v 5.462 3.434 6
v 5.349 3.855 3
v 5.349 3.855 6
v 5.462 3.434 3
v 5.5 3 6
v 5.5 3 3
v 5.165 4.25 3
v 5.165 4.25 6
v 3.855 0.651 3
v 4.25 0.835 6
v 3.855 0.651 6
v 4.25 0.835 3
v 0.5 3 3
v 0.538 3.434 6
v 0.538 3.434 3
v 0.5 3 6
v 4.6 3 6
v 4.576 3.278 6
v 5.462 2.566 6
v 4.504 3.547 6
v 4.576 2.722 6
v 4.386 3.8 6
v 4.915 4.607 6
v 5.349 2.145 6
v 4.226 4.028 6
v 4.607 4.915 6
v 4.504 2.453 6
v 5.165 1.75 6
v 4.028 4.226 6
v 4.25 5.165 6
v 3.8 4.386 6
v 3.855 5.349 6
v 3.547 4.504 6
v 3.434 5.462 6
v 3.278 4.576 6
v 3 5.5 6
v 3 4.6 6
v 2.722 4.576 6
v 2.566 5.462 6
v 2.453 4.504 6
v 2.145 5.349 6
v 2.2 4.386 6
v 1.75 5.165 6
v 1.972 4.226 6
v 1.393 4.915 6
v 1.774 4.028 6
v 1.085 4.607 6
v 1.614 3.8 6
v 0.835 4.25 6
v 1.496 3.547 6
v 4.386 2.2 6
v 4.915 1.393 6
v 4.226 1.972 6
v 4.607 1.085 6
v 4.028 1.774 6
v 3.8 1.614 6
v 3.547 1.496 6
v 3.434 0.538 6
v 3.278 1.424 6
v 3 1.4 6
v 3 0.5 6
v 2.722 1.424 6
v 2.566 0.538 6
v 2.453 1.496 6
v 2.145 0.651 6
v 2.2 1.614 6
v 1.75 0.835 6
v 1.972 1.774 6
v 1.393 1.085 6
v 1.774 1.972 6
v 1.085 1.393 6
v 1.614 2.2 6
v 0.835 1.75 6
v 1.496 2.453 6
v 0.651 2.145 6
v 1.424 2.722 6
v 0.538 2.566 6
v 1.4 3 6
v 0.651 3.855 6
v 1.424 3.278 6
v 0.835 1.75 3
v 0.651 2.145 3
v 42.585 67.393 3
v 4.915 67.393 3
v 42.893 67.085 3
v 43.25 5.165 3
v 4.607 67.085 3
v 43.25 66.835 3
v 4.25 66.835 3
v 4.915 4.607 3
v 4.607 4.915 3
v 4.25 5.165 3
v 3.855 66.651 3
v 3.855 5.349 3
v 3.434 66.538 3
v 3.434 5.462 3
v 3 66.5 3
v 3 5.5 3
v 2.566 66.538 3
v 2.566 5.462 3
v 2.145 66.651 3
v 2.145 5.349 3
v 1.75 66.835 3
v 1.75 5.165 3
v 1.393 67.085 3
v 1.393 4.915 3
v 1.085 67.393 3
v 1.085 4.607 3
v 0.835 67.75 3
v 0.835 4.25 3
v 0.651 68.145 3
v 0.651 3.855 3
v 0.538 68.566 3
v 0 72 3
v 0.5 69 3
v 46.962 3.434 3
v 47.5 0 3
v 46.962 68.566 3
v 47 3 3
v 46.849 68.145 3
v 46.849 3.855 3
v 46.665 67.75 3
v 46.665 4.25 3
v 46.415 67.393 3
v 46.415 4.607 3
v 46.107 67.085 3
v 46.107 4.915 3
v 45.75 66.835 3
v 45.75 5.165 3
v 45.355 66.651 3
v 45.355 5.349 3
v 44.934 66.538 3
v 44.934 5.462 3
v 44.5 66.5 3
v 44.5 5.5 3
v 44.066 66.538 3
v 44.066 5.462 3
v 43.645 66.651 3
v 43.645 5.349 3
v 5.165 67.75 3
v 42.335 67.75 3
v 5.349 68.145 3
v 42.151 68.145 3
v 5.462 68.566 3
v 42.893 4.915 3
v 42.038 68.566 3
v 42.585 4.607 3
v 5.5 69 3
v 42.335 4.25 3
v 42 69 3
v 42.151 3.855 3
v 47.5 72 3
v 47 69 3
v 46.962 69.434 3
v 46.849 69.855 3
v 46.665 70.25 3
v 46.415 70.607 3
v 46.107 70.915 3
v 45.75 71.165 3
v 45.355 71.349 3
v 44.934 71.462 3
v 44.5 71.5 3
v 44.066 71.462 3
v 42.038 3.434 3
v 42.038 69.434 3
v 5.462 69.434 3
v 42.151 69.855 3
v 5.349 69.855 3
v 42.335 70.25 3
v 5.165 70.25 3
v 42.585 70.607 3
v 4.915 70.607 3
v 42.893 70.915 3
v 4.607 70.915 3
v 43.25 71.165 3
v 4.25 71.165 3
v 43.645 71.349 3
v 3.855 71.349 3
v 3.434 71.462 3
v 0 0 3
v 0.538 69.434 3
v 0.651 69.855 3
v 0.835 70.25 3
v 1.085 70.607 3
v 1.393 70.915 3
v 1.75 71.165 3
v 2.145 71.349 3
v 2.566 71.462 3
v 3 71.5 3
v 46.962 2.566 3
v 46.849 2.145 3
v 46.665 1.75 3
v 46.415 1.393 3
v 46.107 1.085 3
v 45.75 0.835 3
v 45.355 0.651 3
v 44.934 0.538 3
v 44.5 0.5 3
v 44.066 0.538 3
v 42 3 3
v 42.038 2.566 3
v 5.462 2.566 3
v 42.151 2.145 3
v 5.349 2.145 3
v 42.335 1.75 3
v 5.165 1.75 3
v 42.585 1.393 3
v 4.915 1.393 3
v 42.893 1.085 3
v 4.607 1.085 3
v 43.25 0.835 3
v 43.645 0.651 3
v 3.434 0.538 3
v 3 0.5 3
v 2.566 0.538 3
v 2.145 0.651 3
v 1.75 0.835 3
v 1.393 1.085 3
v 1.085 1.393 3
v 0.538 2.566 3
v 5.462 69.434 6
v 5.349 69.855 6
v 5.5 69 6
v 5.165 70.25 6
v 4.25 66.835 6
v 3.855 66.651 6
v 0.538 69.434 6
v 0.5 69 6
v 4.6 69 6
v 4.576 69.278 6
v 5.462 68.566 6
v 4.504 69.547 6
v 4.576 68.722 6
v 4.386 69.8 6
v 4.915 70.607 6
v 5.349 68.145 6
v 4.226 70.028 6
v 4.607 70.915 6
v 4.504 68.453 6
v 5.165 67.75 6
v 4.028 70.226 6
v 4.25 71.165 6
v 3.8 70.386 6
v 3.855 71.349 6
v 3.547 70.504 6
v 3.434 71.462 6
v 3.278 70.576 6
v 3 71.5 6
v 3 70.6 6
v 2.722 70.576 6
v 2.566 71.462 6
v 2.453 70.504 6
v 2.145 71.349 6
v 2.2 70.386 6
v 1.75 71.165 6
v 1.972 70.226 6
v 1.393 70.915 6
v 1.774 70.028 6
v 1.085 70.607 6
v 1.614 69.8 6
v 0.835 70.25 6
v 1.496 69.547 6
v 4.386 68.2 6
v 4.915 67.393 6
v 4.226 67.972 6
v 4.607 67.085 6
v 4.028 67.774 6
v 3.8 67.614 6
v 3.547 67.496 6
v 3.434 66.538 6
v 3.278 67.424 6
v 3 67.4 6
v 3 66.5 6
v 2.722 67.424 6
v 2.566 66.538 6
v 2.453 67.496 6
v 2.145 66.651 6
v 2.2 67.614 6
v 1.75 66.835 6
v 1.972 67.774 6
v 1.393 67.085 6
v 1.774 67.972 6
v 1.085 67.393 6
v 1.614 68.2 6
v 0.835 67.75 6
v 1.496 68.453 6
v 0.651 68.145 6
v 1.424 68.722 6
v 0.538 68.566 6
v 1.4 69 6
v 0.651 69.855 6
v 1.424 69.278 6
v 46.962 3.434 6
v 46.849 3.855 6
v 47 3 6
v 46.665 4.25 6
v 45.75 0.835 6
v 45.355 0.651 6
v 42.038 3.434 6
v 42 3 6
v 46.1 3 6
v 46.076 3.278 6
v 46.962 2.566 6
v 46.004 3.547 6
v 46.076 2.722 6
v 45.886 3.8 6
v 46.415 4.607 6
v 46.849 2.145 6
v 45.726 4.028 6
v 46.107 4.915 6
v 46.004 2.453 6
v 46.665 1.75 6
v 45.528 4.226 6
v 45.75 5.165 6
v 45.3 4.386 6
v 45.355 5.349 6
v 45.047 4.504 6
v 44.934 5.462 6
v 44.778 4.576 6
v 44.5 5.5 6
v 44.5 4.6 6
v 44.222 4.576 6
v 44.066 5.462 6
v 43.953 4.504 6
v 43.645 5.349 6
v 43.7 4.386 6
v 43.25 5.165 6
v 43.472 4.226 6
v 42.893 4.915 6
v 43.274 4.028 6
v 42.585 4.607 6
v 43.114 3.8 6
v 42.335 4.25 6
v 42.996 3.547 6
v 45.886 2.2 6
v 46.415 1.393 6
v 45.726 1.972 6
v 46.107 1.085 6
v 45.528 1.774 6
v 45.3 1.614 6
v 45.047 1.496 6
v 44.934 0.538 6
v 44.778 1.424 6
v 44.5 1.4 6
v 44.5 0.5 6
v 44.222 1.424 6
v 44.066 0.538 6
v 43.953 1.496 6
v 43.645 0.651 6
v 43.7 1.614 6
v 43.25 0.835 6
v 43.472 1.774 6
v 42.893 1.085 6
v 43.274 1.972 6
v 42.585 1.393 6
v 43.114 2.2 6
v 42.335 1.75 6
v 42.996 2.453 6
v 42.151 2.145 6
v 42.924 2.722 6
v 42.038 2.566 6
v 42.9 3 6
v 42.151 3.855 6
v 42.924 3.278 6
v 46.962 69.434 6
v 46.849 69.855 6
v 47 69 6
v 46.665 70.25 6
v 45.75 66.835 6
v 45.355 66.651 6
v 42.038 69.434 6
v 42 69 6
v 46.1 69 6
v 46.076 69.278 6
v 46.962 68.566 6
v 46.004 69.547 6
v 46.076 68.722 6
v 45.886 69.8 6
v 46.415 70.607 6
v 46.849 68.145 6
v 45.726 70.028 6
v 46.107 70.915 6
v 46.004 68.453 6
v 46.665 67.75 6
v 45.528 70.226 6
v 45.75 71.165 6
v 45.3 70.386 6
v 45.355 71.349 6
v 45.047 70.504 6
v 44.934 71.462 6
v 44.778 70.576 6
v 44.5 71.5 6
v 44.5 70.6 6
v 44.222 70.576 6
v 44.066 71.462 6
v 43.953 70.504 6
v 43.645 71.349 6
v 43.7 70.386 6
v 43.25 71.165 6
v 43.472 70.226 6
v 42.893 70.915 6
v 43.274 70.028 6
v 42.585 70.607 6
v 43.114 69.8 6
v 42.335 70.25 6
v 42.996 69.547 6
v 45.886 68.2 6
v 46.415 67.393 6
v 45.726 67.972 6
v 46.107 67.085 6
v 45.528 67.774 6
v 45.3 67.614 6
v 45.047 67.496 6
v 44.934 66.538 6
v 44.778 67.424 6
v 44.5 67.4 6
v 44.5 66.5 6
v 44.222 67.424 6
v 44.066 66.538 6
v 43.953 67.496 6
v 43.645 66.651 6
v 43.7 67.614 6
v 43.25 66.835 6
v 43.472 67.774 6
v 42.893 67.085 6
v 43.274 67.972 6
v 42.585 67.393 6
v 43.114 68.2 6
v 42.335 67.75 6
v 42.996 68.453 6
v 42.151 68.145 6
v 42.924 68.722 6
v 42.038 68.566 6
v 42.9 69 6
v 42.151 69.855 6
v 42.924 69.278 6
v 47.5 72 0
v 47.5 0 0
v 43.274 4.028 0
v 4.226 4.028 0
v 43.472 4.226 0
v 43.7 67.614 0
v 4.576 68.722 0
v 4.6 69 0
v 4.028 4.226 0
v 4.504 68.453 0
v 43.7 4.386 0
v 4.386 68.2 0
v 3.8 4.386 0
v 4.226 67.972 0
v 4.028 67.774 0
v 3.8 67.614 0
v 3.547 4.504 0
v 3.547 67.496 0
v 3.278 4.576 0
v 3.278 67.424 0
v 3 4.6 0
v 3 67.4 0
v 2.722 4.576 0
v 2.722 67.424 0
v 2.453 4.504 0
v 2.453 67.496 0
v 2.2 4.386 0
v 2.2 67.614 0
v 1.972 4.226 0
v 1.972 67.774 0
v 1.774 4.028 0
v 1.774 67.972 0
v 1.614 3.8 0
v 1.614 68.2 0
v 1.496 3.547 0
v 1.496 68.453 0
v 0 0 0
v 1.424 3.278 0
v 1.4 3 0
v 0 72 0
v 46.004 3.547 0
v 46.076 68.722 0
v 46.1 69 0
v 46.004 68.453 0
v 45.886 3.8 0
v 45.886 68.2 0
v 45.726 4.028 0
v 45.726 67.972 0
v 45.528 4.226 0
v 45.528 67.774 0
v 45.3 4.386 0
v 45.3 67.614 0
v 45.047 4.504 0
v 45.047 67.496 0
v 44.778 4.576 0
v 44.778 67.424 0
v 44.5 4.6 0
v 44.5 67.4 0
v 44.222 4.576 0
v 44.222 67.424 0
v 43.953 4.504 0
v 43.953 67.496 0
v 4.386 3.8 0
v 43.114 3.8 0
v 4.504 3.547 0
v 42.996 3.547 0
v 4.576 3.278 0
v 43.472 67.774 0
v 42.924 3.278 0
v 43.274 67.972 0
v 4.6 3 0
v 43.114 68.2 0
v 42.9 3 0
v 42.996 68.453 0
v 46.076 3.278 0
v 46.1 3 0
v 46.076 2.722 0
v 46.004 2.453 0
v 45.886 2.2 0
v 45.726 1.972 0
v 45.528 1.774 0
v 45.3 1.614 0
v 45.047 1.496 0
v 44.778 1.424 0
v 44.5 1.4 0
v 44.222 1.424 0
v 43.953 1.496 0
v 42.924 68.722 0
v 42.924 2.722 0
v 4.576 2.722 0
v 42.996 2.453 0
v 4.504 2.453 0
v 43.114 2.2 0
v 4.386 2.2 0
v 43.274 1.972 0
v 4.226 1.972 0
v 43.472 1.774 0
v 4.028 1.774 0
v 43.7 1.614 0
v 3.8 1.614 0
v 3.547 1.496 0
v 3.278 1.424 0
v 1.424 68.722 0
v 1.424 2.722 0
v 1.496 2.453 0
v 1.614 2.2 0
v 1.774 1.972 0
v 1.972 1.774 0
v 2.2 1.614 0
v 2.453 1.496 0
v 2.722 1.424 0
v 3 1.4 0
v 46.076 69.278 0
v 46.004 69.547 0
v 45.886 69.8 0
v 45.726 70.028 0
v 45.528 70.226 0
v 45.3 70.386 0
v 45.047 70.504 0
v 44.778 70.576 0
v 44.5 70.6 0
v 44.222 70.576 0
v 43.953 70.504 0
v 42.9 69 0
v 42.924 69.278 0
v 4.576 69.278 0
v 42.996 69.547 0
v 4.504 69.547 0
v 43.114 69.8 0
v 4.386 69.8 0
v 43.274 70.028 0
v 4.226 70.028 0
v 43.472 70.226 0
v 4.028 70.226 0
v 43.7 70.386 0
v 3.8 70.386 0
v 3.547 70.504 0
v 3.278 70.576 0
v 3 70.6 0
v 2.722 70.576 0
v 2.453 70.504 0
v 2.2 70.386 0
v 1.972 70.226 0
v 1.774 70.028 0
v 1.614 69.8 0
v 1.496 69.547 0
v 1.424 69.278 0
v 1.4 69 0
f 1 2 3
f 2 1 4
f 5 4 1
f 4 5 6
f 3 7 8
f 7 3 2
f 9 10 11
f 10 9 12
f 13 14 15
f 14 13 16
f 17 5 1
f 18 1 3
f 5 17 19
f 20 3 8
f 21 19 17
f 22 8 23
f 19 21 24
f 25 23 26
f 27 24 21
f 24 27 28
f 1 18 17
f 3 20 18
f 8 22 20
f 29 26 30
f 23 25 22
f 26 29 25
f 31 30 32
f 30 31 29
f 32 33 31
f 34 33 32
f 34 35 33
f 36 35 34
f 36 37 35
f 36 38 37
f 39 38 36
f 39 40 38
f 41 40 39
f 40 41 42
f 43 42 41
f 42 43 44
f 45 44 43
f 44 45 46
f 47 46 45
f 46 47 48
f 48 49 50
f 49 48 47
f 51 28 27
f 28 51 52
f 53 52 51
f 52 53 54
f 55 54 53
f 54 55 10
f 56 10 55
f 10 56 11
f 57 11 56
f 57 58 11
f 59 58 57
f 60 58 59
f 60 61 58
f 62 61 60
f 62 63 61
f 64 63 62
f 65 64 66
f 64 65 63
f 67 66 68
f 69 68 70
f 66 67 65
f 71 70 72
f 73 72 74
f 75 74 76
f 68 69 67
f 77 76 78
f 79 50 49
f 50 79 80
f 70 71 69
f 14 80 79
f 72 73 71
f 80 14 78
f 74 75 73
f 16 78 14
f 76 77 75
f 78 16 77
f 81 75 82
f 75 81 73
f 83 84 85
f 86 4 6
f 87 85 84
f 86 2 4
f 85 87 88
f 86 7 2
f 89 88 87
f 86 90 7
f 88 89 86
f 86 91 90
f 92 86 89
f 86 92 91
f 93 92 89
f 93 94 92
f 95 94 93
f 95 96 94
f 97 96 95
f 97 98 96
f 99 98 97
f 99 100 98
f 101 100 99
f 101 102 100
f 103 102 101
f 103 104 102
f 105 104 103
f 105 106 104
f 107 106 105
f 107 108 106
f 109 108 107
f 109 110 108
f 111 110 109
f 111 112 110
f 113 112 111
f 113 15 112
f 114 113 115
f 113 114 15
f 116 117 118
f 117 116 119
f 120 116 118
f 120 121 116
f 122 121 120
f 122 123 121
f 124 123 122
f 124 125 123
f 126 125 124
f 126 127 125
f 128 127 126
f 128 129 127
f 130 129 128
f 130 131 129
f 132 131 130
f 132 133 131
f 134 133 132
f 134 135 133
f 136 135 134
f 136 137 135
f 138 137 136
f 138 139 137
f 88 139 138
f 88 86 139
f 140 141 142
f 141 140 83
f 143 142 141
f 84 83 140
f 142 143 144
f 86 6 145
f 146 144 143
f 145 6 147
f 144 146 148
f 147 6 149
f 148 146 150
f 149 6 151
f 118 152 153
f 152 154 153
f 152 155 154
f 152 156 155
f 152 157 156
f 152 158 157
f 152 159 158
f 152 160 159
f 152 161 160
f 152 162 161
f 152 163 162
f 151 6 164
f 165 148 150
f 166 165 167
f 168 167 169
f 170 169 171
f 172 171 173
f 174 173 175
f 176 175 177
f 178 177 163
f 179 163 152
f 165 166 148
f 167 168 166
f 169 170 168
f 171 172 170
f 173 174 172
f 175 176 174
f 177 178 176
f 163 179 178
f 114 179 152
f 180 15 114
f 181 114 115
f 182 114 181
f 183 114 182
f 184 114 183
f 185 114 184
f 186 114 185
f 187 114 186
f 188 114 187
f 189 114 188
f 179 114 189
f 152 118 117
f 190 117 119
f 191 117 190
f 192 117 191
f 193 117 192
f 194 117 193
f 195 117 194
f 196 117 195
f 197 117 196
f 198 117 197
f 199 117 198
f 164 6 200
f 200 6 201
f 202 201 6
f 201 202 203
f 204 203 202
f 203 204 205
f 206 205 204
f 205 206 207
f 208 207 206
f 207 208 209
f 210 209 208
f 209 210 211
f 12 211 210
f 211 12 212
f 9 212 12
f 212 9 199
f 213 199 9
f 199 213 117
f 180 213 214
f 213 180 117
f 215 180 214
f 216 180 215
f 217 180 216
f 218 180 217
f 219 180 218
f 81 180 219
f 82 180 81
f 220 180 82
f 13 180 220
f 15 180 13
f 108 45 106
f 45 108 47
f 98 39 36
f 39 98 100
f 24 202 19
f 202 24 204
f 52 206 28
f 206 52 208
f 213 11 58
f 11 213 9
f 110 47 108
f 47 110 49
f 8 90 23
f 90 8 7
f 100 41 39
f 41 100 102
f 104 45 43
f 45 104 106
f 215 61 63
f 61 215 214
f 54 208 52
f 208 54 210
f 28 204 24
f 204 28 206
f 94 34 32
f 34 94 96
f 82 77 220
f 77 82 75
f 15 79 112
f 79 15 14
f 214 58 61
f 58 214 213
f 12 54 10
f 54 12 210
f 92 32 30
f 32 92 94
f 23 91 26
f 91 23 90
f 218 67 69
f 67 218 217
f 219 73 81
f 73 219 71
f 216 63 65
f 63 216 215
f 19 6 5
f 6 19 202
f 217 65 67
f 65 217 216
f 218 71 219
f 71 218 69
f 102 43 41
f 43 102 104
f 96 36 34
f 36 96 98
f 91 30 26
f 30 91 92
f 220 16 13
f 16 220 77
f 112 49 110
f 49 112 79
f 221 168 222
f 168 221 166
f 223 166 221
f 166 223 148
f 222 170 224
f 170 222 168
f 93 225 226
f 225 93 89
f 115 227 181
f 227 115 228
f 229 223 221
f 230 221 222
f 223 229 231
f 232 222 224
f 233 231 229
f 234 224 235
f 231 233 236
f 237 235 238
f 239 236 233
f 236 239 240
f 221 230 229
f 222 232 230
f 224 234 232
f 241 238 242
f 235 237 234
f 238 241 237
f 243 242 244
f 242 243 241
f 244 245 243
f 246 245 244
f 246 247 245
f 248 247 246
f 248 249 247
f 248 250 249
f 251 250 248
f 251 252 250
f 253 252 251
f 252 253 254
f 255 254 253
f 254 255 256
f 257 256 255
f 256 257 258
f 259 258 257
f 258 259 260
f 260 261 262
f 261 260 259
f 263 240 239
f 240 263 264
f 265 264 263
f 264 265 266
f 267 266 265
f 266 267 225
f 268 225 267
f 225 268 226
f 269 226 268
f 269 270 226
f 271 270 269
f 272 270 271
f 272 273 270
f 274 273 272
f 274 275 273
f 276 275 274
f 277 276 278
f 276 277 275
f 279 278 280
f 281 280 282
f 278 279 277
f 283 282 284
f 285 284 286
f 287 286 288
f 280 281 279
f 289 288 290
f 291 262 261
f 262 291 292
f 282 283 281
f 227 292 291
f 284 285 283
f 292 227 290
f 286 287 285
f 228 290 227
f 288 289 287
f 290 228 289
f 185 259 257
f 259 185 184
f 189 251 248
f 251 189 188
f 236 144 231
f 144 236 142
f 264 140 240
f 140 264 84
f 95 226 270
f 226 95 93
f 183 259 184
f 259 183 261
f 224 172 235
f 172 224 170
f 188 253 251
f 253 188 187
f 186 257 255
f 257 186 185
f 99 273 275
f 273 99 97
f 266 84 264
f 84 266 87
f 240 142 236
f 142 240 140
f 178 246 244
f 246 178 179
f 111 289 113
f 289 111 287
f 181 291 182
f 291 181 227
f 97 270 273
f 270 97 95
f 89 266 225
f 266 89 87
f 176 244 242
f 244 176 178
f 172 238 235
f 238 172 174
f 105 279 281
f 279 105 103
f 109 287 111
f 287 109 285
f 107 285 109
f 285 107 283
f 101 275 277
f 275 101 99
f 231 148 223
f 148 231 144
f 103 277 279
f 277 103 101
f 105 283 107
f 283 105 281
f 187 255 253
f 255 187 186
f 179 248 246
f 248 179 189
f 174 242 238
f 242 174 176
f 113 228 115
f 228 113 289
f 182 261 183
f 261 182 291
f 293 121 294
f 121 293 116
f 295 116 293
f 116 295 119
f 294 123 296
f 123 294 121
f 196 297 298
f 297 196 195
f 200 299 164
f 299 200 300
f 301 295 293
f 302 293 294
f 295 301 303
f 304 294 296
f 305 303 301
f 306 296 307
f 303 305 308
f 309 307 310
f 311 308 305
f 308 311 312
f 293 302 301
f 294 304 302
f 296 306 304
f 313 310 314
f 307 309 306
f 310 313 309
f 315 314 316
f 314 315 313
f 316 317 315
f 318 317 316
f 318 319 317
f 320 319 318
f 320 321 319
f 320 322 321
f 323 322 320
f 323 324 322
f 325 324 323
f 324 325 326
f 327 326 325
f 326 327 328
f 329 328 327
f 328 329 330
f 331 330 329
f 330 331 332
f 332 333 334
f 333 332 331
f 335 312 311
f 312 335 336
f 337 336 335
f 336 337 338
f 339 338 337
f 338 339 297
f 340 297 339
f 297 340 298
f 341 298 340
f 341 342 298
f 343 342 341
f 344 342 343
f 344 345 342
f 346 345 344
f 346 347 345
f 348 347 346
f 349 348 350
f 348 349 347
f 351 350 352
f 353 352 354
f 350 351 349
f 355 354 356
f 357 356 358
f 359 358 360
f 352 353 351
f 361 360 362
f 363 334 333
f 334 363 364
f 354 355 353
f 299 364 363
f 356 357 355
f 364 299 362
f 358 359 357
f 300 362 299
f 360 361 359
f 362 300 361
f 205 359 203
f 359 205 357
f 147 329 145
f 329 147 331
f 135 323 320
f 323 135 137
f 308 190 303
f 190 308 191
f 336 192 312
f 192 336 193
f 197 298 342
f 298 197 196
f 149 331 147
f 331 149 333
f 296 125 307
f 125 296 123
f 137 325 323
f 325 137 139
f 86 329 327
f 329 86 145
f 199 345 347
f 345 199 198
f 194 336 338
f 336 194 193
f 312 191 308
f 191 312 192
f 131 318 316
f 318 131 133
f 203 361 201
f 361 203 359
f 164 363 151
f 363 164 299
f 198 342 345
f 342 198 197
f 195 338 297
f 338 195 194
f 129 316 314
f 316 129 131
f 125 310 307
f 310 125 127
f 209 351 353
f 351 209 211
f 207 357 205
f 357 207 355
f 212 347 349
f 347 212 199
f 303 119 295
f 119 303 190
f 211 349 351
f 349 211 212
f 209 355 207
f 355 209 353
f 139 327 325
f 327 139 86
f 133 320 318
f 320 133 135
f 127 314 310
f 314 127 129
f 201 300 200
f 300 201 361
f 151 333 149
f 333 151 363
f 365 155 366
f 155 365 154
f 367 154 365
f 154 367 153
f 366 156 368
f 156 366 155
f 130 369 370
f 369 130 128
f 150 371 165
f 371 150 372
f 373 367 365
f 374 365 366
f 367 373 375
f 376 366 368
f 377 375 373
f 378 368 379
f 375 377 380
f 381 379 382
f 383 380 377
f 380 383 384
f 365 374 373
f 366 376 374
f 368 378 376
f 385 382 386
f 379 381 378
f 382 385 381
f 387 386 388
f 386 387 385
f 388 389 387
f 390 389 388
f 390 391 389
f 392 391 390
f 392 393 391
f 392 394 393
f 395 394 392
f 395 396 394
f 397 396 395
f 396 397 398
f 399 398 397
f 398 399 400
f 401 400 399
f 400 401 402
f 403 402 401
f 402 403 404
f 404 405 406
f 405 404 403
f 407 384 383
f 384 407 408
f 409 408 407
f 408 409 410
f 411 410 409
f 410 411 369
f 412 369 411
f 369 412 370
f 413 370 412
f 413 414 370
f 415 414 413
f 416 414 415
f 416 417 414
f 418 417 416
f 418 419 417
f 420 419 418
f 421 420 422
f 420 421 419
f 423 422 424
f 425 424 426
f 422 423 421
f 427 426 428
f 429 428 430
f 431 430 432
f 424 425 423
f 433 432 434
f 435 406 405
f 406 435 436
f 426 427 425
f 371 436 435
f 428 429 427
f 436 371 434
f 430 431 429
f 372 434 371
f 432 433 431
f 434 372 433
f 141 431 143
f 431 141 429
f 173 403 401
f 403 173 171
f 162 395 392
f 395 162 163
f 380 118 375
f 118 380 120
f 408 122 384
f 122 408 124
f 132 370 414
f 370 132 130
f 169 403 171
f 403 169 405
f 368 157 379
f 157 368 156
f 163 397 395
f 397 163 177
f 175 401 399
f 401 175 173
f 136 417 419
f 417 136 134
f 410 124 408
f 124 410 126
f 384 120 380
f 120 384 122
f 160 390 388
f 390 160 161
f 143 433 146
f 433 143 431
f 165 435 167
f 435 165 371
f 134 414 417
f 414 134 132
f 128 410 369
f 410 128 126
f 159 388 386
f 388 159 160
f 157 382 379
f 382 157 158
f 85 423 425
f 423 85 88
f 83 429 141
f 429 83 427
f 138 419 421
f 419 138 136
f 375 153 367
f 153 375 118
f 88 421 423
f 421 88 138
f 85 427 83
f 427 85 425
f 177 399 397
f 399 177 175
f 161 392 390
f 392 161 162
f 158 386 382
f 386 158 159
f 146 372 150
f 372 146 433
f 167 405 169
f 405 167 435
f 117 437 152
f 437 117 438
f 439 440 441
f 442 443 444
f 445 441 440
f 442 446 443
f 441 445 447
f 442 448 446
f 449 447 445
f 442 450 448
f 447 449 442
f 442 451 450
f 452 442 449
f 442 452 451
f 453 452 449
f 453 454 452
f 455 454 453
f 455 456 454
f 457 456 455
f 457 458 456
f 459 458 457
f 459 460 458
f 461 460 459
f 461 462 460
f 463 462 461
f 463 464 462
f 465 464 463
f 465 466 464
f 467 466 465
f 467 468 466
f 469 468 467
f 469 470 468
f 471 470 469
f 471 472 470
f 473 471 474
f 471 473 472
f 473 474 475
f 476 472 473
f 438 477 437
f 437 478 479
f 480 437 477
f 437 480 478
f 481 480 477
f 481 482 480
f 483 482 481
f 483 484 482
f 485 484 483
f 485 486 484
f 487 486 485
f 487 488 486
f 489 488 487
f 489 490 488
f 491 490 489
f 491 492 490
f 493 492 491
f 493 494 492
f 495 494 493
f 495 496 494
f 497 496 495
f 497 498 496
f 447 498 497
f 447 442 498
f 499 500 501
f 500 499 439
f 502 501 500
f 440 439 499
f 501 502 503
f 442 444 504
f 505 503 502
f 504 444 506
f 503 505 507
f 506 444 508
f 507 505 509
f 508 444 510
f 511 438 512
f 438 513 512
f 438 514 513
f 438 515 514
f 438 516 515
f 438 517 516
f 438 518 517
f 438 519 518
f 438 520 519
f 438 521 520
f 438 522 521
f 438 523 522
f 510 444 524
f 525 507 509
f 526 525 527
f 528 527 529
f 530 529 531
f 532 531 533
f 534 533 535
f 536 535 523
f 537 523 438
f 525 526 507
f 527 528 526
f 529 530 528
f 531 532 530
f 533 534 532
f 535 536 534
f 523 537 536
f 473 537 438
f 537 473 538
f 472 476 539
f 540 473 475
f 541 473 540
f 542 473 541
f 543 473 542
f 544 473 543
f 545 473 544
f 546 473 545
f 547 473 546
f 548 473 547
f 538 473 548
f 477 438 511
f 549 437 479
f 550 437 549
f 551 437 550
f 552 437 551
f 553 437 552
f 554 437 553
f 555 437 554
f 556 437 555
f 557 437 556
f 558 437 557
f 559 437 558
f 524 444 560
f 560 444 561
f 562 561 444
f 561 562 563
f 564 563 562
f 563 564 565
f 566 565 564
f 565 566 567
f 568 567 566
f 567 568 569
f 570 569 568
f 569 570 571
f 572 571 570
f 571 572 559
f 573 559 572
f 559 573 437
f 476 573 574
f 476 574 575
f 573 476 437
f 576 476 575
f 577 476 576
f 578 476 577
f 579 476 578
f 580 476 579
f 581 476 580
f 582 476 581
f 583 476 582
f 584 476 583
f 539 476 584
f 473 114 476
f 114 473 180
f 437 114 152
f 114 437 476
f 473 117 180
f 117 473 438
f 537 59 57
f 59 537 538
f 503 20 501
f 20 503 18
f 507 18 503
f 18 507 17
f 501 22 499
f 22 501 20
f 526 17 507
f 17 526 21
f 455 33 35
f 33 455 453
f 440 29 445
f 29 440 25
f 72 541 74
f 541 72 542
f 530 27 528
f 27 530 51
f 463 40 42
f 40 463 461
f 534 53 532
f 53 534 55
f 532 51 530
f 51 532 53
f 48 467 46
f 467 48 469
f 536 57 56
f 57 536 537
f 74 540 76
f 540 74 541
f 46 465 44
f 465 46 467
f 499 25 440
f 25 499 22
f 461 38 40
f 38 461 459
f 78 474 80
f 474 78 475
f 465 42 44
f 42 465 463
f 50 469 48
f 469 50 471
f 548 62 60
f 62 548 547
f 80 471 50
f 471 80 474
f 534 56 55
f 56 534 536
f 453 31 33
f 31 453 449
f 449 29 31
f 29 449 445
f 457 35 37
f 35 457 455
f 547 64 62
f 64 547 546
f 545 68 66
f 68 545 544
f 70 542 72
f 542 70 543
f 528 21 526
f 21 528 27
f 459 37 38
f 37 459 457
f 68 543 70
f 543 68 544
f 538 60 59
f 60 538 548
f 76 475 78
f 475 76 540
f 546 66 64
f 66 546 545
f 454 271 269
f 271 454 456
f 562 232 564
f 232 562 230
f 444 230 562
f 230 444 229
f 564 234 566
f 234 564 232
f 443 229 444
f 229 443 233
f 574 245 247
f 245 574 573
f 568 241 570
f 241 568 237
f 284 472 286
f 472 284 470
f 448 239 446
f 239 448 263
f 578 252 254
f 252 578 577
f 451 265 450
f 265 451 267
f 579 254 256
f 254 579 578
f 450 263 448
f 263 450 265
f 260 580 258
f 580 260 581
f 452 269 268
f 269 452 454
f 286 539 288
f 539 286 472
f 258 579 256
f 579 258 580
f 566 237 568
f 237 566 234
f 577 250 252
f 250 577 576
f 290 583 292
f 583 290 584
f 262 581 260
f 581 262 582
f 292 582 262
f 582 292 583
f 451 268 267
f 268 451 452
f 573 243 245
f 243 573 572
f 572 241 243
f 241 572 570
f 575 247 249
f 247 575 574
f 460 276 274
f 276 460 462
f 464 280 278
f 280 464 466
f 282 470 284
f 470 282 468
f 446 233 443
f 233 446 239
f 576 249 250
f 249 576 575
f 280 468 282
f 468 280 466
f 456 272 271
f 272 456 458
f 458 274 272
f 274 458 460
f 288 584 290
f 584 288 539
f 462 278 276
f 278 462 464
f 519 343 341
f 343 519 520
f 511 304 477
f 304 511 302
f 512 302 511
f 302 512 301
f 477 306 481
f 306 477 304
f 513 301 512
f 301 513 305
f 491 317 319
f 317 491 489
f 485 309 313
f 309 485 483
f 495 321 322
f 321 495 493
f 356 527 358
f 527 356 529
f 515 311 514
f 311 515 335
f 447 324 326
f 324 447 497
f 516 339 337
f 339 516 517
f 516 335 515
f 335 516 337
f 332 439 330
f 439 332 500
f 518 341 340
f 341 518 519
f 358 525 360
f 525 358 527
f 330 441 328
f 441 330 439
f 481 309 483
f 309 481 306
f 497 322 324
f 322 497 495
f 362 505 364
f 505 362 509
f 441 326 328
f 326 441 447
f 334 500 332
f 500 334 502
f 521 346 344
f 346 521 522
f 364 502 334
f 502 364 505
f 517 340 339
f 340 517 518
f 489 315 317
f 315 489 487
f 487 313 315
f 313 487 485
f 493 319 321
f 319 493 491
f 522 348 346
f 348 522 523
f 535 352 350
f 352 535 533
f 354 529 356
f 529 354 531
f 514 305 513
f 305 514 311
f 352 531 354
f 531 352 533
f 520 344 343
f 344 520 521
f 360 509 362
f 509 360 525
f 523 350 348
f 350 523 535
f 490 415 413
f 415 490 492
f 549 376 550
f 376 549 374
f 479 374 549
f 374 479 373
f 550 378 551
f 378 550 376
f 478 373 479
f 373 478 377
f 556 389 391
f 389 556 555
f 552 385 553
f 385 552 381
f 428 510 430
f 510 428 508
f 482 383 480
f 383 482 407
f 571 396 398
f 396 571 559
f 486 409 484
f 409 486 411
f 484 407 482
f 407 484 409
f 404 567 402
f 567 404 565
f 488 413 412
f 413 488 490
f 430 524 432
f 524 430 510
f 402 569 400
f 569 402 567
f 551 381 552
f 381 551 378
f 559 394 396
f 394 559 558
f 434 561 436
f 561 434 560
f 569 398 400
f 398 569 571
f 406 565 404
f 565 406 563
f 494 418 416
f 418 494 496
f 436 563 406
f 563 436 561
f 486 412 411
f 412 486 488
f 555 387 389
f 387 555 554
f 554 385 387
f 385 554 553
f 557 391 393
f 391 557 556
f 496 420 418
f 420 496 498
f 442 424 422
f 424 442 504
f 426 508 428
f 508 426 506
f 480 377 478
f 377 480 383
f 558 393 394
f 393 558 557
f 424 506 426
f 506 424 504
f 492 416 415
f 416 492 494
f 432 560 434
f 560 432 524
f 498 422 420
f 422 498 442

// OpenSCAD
//
// 秋月電子の C基板と同形状の板
//
// AkizukiPCB_TypeC-2-20250515A.scad
//
// Last update: 2025-05-25(Sun) 08:08 JST / 2025-05-24(Sat) 23:08 UTC
// Last update: 2025-05-26(Mon) 11:50 JST / 2025-05-26(Mon) 02:50 UTC
//

Px = 47.5; Py = 72.0; Pz = 3.0; // パネルの 横・縦・厚さ（P は "Panel" の P）
Cd = 5.0;  Cz = 3.0;            // 円柱の直径、厚さ（Cは "Cylinder" の C）
Hd = 3.2;  Hp = 3.0;            // 穴の直径、位置（H は "Hole" の H）

difference() {
    // (1) まず、4本の円柱を持つ直方体のパネルを作る
    union() {
        // パネルを用意
        cube([Px, Py, Pz]);
        // 円柱を4本立てる
        for (x = [Hp, Px - Hp
            ])
            for (y = [Hp, Py - Hp])
                translate([x, y, Pz]) cylinder(h = Cz, d = Cd, $fn = 36);
    }
    // (2) 次に、それぞれの円柱に穴を貫通させる
    for (x = [Hp, Px - Hp])
        for (y = [Hp, Py - Hp])
            translate([x, y, -1.0]) cylinder(h = Pz + Cz + 2.0, d = Hd, $fn = 36);
            // 確実に穴をあけるため、パネル厚+円柱厚より2mm長い円柱をパネル底面より1mm沈めて配置している
}
